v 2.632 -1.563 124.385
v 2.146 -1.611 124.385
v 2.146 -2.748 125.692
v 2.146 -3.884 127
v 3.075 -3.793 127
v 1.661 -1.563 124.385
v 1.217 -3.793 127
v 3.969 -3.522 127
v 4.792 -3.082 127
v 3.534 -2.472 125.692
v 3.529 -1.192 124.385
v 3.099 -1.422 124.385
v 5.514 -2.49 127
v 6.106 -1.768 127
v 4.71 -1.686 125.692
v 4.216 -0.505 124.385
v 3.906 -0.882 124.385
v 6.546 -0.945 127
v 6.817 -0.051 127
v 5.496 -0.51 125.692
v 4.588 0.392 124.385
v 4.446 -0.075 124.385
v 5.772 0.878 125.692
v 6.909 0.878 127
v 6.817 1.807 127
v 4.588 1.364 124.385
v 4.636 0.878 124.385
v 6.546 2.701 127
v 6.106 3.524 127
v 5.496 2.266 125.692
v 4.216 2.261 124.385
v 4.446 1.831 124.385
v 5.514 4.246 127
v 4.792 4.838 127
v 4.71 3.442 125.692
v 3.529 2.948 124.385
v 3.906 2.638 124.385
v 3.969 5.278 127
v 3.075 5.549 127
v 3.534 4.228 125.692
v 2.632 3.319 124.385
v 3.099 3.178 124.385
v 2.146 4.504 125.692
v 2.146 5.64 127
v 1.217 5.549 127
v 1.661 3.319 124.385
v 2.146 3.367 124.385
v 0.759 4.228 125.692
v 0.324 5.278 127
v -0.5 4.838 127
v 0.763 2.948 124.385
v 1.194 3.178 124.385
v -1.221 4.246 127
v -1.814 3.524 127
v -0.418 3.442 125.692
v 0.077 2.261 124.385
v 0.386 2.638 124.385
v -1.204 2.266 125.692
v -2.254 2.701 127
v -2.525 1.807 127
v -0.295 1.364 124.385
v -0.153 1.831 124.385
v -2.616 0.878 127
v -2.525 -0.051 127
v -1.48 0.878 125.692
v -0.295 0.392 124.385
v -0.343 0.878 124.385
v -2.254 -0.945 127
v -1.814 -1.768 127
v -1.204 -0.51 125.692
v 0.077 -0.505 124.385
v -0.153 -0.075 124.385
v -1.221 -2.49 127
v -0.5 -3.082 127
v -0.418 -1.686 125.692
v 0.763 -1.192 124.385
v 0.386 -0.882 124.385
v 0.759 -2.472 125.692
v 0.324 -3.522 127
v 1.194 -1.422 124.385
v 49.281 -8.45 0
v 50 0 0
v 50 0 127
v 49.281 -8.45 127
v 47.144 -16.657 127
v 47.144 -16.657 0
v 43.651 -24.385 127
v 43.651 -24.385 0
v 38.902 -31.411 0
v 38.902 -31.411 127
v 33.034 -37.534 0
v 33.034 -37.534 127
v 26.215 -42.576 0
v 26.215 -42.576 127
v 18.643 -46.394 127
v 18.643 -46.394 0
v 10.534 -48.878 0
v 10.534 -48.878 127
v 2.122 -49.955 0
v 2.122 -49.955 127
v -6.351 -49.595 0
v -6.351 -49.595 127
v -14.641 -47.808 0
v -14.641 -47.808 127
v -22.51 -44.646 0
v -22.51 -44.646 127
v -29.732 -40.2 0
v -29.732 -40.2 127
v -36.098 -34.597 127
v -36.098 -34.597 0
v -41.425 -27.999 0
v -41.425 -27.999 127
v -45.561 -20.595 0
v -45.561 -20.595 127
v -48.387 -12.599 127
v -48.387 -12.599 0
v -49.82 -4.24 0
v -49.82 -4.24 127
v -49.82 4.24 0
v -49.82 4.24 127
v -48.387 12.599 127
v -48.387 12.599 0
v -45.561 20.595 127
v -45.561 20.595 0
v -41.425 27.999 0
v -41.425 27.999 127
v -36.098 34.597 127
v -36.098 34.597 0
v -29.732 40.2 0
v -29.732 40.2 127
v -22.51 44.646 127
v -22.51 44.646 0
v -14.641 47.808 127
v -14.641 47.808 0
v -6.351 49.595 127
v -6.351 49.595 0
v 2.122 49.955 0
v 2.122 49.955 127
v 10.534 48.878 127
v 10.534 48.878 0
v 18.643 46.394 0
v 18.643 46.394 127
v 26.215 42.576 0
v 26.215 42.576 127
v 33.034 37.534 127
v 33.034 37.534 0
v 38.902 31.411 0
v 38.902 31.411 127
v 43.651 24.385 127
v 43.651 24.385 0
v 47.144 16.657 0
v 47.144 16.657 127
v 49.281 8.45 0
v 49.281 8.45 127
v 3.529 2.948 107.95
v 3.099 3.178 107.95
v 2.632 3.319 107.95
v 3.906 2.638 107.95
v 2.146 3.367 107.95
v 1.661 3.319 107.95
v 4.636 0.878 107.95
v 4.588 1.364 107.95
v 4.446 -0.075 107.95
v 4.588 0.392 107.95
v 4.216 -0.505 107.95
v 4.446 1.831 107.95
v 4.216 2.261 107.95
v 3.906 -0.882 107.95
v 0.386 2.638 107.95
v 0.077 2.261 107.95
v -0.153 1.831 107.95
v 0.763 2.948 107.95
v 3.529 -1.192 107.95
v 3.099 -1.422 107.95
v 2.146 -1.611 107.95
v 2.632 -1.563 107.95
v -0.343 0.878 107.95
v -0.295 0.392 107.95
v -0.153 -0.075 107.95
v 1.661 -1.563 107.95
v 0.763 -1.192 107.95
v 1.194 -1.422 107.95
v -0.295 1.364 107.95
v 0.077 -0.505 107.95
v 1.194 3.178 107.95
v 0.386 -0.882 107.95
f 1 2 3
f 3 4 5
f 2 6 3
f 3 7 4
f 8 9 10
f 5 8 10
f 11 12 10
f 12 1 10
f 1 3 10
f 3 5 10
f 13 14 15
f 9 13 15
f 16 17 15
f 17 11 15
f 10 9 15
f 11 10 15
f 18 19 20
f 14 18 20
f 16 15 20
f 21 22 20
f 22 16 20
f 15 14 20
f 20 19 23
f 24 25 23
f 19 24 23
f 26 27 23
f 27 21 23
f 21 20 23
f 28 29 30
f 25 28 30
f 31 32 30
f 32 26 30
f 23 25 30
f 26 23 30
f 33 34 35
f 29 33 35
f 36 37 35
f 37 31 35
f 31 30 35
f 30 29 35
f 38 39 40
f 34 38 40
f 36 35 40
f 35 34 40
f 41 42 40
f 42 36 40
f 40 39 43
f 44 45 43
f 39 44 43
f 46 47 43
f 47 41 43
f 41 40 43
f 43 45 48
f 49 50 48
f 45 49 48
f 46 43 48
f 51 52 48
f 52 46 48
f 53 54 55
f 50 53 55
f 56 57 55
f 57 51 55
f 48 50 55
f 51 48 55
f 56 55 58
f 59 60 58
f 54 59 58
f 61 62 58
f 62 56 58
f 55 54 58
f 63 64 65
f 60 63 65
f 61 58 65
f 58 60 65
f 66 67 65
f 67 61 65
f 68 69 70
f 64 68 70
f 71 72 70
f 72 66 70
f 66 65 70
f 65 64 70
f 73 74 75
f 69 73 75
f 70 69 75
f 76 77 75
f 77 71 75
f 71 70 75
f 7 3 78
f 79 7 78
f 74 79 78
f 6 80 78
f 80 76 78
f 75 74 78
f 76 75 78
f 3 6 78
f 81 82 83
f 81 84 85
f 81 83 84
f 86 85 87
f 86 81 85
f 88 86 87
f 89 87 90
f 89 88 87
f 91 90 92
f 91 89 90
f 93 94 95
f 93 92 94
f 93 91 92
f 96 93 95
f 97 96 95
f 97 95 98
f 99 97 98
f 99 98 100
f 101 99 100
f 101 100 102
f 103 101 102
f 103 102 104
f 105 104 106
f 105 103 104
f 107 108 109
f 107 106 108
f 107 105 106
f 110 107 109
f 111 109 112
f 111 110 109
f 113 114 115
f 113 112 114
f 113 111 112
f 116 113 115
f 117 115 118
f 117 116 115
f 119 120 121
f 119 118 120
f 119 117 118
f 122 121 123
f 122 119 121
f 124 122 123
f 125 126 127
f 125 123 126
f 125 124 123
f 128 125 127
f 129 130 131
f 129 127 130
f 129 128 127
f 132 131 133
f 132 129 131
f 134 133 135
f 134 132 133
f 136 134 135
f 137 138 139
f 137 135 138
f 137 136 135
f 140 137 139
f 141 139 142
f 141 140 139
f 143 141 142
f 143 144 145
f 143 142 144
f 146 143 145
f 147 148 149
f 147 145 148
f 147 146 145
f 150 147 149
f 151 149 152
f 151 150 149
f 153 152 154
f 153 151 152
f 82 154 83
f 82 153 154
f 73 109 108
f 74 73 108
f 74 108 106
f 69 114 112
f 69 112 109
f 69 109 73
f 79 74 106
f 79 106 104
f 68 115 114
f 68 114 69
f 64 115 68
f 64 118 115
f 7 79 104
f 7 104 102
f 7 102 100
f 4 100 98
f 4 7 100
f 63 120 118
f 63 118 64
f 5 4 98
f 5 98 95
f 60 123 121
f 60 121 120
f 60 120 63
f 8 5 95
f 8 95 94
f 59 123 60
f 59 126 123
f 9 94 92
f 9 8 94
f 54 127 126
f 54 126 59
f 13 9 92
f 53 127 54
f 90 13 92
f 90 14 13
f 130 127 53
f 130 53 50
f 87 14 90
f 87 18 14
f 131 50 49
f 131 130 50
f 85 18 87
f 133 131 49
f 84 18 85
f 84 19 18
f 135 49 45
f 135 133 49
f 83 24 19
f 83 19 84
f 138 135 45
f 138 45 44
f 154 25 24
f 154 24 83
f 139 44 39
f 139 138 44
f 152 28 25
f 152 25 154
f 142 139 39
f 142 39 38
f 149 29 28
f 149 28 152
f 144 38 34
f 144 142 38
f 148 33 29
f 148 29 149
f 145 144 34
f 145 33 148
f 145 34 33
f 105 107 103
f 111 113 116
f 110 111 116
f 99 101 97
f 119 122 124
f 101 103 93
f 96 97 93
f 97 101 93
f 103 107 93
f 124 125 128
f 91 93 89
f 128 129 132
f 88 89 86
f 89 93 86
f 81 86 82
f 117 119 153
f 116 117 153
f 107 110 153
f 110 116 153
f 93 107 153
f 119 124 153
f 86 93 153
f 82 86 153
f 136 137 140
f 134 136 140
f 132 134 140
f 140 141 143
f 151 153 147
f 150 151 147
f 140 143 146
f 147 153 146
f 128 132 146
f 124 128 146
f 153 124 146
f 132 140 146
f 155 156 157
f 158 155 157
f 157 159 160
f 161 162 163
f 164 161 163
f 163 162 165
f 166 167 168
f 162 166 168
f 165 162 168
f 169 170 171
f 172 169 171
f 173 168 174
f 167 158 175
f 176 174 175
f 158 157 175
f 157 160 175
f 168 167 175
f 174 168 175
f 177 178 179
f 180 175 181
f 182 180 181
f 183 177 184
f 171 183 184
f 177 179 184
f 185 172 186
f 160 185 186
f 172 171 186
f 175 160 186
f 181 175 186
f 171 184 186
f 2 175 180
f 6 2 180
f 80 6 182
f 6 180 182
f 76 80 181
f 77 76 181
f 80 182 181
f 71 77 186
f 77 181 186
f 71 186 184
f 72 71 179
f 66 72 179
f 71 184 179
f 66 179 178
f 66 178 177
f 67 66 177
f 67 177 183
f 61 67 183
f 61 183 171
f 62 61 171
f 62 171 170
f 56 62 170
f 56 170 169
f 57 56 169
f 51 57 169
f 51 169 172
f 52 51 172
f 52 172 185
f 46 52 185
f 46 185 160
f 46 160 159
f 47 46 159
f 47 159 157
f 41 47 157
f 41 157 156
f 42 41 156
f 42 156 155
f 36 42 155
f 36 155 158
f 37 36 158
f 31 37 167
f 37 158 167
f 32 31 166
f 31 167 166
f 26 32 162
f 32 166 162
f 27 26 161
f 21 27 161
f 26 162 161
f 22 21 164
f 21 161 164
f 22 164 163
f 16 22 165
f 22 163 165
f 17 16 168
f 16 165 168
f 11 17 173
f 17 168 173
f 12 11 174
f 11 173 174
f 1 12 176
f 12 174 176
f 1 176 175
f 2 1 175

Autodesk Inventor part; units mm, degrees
ref_plane "YZ Plane" through (0, 0, 0) normal (1, 0, 0) x (0, 1, 0)
ref_plane "XZ Plane" through (0, 0, 0) normal (0, 1, 0) x (-1, 0, 0)
ref_plane "XY Plane" through (0, 0, 0) normal (0, 0, 1) x (1, 0, 0)
sketch "Sketch1" plane through (0, 0, 0) normal (0, 0, 1) x (1, 0, 0)
  circle A0 centre (0, 0) radius 50
  dimension "d0" = 100
extrude "Extrusion1" add sketch "Sketch1" along normal blind 127
sketch "Sketch2" plane through (0, 0, 0) normal (0, 0, -1) x (-1, 0, 0)
  point P0 (0, 0)
  point P1 (3.0158, -0.2622)
hole "Hole1" at (-3.0158, -0.2622, 0) direction (0, 0, -1) diameter 5 depth 25.4 tip angle 118
sketch "Sketch3" plane through (0, 0, 127) normal (0, 0, 1) x (1, 0, 0)
  point P0 (0, 0)
  point P1 (2.1463, 0.878)
hole "Hole2" at (2.1463, 0.878, 127) direction (0, 0, -1) diameter 4.9784 depth 19.05 countersink diameter 9.525 countersink angle 82 thread size "1/4-20 UNC" class "2B" standard "ANSI Unified Screw Threads"
properties part number "Media container"
